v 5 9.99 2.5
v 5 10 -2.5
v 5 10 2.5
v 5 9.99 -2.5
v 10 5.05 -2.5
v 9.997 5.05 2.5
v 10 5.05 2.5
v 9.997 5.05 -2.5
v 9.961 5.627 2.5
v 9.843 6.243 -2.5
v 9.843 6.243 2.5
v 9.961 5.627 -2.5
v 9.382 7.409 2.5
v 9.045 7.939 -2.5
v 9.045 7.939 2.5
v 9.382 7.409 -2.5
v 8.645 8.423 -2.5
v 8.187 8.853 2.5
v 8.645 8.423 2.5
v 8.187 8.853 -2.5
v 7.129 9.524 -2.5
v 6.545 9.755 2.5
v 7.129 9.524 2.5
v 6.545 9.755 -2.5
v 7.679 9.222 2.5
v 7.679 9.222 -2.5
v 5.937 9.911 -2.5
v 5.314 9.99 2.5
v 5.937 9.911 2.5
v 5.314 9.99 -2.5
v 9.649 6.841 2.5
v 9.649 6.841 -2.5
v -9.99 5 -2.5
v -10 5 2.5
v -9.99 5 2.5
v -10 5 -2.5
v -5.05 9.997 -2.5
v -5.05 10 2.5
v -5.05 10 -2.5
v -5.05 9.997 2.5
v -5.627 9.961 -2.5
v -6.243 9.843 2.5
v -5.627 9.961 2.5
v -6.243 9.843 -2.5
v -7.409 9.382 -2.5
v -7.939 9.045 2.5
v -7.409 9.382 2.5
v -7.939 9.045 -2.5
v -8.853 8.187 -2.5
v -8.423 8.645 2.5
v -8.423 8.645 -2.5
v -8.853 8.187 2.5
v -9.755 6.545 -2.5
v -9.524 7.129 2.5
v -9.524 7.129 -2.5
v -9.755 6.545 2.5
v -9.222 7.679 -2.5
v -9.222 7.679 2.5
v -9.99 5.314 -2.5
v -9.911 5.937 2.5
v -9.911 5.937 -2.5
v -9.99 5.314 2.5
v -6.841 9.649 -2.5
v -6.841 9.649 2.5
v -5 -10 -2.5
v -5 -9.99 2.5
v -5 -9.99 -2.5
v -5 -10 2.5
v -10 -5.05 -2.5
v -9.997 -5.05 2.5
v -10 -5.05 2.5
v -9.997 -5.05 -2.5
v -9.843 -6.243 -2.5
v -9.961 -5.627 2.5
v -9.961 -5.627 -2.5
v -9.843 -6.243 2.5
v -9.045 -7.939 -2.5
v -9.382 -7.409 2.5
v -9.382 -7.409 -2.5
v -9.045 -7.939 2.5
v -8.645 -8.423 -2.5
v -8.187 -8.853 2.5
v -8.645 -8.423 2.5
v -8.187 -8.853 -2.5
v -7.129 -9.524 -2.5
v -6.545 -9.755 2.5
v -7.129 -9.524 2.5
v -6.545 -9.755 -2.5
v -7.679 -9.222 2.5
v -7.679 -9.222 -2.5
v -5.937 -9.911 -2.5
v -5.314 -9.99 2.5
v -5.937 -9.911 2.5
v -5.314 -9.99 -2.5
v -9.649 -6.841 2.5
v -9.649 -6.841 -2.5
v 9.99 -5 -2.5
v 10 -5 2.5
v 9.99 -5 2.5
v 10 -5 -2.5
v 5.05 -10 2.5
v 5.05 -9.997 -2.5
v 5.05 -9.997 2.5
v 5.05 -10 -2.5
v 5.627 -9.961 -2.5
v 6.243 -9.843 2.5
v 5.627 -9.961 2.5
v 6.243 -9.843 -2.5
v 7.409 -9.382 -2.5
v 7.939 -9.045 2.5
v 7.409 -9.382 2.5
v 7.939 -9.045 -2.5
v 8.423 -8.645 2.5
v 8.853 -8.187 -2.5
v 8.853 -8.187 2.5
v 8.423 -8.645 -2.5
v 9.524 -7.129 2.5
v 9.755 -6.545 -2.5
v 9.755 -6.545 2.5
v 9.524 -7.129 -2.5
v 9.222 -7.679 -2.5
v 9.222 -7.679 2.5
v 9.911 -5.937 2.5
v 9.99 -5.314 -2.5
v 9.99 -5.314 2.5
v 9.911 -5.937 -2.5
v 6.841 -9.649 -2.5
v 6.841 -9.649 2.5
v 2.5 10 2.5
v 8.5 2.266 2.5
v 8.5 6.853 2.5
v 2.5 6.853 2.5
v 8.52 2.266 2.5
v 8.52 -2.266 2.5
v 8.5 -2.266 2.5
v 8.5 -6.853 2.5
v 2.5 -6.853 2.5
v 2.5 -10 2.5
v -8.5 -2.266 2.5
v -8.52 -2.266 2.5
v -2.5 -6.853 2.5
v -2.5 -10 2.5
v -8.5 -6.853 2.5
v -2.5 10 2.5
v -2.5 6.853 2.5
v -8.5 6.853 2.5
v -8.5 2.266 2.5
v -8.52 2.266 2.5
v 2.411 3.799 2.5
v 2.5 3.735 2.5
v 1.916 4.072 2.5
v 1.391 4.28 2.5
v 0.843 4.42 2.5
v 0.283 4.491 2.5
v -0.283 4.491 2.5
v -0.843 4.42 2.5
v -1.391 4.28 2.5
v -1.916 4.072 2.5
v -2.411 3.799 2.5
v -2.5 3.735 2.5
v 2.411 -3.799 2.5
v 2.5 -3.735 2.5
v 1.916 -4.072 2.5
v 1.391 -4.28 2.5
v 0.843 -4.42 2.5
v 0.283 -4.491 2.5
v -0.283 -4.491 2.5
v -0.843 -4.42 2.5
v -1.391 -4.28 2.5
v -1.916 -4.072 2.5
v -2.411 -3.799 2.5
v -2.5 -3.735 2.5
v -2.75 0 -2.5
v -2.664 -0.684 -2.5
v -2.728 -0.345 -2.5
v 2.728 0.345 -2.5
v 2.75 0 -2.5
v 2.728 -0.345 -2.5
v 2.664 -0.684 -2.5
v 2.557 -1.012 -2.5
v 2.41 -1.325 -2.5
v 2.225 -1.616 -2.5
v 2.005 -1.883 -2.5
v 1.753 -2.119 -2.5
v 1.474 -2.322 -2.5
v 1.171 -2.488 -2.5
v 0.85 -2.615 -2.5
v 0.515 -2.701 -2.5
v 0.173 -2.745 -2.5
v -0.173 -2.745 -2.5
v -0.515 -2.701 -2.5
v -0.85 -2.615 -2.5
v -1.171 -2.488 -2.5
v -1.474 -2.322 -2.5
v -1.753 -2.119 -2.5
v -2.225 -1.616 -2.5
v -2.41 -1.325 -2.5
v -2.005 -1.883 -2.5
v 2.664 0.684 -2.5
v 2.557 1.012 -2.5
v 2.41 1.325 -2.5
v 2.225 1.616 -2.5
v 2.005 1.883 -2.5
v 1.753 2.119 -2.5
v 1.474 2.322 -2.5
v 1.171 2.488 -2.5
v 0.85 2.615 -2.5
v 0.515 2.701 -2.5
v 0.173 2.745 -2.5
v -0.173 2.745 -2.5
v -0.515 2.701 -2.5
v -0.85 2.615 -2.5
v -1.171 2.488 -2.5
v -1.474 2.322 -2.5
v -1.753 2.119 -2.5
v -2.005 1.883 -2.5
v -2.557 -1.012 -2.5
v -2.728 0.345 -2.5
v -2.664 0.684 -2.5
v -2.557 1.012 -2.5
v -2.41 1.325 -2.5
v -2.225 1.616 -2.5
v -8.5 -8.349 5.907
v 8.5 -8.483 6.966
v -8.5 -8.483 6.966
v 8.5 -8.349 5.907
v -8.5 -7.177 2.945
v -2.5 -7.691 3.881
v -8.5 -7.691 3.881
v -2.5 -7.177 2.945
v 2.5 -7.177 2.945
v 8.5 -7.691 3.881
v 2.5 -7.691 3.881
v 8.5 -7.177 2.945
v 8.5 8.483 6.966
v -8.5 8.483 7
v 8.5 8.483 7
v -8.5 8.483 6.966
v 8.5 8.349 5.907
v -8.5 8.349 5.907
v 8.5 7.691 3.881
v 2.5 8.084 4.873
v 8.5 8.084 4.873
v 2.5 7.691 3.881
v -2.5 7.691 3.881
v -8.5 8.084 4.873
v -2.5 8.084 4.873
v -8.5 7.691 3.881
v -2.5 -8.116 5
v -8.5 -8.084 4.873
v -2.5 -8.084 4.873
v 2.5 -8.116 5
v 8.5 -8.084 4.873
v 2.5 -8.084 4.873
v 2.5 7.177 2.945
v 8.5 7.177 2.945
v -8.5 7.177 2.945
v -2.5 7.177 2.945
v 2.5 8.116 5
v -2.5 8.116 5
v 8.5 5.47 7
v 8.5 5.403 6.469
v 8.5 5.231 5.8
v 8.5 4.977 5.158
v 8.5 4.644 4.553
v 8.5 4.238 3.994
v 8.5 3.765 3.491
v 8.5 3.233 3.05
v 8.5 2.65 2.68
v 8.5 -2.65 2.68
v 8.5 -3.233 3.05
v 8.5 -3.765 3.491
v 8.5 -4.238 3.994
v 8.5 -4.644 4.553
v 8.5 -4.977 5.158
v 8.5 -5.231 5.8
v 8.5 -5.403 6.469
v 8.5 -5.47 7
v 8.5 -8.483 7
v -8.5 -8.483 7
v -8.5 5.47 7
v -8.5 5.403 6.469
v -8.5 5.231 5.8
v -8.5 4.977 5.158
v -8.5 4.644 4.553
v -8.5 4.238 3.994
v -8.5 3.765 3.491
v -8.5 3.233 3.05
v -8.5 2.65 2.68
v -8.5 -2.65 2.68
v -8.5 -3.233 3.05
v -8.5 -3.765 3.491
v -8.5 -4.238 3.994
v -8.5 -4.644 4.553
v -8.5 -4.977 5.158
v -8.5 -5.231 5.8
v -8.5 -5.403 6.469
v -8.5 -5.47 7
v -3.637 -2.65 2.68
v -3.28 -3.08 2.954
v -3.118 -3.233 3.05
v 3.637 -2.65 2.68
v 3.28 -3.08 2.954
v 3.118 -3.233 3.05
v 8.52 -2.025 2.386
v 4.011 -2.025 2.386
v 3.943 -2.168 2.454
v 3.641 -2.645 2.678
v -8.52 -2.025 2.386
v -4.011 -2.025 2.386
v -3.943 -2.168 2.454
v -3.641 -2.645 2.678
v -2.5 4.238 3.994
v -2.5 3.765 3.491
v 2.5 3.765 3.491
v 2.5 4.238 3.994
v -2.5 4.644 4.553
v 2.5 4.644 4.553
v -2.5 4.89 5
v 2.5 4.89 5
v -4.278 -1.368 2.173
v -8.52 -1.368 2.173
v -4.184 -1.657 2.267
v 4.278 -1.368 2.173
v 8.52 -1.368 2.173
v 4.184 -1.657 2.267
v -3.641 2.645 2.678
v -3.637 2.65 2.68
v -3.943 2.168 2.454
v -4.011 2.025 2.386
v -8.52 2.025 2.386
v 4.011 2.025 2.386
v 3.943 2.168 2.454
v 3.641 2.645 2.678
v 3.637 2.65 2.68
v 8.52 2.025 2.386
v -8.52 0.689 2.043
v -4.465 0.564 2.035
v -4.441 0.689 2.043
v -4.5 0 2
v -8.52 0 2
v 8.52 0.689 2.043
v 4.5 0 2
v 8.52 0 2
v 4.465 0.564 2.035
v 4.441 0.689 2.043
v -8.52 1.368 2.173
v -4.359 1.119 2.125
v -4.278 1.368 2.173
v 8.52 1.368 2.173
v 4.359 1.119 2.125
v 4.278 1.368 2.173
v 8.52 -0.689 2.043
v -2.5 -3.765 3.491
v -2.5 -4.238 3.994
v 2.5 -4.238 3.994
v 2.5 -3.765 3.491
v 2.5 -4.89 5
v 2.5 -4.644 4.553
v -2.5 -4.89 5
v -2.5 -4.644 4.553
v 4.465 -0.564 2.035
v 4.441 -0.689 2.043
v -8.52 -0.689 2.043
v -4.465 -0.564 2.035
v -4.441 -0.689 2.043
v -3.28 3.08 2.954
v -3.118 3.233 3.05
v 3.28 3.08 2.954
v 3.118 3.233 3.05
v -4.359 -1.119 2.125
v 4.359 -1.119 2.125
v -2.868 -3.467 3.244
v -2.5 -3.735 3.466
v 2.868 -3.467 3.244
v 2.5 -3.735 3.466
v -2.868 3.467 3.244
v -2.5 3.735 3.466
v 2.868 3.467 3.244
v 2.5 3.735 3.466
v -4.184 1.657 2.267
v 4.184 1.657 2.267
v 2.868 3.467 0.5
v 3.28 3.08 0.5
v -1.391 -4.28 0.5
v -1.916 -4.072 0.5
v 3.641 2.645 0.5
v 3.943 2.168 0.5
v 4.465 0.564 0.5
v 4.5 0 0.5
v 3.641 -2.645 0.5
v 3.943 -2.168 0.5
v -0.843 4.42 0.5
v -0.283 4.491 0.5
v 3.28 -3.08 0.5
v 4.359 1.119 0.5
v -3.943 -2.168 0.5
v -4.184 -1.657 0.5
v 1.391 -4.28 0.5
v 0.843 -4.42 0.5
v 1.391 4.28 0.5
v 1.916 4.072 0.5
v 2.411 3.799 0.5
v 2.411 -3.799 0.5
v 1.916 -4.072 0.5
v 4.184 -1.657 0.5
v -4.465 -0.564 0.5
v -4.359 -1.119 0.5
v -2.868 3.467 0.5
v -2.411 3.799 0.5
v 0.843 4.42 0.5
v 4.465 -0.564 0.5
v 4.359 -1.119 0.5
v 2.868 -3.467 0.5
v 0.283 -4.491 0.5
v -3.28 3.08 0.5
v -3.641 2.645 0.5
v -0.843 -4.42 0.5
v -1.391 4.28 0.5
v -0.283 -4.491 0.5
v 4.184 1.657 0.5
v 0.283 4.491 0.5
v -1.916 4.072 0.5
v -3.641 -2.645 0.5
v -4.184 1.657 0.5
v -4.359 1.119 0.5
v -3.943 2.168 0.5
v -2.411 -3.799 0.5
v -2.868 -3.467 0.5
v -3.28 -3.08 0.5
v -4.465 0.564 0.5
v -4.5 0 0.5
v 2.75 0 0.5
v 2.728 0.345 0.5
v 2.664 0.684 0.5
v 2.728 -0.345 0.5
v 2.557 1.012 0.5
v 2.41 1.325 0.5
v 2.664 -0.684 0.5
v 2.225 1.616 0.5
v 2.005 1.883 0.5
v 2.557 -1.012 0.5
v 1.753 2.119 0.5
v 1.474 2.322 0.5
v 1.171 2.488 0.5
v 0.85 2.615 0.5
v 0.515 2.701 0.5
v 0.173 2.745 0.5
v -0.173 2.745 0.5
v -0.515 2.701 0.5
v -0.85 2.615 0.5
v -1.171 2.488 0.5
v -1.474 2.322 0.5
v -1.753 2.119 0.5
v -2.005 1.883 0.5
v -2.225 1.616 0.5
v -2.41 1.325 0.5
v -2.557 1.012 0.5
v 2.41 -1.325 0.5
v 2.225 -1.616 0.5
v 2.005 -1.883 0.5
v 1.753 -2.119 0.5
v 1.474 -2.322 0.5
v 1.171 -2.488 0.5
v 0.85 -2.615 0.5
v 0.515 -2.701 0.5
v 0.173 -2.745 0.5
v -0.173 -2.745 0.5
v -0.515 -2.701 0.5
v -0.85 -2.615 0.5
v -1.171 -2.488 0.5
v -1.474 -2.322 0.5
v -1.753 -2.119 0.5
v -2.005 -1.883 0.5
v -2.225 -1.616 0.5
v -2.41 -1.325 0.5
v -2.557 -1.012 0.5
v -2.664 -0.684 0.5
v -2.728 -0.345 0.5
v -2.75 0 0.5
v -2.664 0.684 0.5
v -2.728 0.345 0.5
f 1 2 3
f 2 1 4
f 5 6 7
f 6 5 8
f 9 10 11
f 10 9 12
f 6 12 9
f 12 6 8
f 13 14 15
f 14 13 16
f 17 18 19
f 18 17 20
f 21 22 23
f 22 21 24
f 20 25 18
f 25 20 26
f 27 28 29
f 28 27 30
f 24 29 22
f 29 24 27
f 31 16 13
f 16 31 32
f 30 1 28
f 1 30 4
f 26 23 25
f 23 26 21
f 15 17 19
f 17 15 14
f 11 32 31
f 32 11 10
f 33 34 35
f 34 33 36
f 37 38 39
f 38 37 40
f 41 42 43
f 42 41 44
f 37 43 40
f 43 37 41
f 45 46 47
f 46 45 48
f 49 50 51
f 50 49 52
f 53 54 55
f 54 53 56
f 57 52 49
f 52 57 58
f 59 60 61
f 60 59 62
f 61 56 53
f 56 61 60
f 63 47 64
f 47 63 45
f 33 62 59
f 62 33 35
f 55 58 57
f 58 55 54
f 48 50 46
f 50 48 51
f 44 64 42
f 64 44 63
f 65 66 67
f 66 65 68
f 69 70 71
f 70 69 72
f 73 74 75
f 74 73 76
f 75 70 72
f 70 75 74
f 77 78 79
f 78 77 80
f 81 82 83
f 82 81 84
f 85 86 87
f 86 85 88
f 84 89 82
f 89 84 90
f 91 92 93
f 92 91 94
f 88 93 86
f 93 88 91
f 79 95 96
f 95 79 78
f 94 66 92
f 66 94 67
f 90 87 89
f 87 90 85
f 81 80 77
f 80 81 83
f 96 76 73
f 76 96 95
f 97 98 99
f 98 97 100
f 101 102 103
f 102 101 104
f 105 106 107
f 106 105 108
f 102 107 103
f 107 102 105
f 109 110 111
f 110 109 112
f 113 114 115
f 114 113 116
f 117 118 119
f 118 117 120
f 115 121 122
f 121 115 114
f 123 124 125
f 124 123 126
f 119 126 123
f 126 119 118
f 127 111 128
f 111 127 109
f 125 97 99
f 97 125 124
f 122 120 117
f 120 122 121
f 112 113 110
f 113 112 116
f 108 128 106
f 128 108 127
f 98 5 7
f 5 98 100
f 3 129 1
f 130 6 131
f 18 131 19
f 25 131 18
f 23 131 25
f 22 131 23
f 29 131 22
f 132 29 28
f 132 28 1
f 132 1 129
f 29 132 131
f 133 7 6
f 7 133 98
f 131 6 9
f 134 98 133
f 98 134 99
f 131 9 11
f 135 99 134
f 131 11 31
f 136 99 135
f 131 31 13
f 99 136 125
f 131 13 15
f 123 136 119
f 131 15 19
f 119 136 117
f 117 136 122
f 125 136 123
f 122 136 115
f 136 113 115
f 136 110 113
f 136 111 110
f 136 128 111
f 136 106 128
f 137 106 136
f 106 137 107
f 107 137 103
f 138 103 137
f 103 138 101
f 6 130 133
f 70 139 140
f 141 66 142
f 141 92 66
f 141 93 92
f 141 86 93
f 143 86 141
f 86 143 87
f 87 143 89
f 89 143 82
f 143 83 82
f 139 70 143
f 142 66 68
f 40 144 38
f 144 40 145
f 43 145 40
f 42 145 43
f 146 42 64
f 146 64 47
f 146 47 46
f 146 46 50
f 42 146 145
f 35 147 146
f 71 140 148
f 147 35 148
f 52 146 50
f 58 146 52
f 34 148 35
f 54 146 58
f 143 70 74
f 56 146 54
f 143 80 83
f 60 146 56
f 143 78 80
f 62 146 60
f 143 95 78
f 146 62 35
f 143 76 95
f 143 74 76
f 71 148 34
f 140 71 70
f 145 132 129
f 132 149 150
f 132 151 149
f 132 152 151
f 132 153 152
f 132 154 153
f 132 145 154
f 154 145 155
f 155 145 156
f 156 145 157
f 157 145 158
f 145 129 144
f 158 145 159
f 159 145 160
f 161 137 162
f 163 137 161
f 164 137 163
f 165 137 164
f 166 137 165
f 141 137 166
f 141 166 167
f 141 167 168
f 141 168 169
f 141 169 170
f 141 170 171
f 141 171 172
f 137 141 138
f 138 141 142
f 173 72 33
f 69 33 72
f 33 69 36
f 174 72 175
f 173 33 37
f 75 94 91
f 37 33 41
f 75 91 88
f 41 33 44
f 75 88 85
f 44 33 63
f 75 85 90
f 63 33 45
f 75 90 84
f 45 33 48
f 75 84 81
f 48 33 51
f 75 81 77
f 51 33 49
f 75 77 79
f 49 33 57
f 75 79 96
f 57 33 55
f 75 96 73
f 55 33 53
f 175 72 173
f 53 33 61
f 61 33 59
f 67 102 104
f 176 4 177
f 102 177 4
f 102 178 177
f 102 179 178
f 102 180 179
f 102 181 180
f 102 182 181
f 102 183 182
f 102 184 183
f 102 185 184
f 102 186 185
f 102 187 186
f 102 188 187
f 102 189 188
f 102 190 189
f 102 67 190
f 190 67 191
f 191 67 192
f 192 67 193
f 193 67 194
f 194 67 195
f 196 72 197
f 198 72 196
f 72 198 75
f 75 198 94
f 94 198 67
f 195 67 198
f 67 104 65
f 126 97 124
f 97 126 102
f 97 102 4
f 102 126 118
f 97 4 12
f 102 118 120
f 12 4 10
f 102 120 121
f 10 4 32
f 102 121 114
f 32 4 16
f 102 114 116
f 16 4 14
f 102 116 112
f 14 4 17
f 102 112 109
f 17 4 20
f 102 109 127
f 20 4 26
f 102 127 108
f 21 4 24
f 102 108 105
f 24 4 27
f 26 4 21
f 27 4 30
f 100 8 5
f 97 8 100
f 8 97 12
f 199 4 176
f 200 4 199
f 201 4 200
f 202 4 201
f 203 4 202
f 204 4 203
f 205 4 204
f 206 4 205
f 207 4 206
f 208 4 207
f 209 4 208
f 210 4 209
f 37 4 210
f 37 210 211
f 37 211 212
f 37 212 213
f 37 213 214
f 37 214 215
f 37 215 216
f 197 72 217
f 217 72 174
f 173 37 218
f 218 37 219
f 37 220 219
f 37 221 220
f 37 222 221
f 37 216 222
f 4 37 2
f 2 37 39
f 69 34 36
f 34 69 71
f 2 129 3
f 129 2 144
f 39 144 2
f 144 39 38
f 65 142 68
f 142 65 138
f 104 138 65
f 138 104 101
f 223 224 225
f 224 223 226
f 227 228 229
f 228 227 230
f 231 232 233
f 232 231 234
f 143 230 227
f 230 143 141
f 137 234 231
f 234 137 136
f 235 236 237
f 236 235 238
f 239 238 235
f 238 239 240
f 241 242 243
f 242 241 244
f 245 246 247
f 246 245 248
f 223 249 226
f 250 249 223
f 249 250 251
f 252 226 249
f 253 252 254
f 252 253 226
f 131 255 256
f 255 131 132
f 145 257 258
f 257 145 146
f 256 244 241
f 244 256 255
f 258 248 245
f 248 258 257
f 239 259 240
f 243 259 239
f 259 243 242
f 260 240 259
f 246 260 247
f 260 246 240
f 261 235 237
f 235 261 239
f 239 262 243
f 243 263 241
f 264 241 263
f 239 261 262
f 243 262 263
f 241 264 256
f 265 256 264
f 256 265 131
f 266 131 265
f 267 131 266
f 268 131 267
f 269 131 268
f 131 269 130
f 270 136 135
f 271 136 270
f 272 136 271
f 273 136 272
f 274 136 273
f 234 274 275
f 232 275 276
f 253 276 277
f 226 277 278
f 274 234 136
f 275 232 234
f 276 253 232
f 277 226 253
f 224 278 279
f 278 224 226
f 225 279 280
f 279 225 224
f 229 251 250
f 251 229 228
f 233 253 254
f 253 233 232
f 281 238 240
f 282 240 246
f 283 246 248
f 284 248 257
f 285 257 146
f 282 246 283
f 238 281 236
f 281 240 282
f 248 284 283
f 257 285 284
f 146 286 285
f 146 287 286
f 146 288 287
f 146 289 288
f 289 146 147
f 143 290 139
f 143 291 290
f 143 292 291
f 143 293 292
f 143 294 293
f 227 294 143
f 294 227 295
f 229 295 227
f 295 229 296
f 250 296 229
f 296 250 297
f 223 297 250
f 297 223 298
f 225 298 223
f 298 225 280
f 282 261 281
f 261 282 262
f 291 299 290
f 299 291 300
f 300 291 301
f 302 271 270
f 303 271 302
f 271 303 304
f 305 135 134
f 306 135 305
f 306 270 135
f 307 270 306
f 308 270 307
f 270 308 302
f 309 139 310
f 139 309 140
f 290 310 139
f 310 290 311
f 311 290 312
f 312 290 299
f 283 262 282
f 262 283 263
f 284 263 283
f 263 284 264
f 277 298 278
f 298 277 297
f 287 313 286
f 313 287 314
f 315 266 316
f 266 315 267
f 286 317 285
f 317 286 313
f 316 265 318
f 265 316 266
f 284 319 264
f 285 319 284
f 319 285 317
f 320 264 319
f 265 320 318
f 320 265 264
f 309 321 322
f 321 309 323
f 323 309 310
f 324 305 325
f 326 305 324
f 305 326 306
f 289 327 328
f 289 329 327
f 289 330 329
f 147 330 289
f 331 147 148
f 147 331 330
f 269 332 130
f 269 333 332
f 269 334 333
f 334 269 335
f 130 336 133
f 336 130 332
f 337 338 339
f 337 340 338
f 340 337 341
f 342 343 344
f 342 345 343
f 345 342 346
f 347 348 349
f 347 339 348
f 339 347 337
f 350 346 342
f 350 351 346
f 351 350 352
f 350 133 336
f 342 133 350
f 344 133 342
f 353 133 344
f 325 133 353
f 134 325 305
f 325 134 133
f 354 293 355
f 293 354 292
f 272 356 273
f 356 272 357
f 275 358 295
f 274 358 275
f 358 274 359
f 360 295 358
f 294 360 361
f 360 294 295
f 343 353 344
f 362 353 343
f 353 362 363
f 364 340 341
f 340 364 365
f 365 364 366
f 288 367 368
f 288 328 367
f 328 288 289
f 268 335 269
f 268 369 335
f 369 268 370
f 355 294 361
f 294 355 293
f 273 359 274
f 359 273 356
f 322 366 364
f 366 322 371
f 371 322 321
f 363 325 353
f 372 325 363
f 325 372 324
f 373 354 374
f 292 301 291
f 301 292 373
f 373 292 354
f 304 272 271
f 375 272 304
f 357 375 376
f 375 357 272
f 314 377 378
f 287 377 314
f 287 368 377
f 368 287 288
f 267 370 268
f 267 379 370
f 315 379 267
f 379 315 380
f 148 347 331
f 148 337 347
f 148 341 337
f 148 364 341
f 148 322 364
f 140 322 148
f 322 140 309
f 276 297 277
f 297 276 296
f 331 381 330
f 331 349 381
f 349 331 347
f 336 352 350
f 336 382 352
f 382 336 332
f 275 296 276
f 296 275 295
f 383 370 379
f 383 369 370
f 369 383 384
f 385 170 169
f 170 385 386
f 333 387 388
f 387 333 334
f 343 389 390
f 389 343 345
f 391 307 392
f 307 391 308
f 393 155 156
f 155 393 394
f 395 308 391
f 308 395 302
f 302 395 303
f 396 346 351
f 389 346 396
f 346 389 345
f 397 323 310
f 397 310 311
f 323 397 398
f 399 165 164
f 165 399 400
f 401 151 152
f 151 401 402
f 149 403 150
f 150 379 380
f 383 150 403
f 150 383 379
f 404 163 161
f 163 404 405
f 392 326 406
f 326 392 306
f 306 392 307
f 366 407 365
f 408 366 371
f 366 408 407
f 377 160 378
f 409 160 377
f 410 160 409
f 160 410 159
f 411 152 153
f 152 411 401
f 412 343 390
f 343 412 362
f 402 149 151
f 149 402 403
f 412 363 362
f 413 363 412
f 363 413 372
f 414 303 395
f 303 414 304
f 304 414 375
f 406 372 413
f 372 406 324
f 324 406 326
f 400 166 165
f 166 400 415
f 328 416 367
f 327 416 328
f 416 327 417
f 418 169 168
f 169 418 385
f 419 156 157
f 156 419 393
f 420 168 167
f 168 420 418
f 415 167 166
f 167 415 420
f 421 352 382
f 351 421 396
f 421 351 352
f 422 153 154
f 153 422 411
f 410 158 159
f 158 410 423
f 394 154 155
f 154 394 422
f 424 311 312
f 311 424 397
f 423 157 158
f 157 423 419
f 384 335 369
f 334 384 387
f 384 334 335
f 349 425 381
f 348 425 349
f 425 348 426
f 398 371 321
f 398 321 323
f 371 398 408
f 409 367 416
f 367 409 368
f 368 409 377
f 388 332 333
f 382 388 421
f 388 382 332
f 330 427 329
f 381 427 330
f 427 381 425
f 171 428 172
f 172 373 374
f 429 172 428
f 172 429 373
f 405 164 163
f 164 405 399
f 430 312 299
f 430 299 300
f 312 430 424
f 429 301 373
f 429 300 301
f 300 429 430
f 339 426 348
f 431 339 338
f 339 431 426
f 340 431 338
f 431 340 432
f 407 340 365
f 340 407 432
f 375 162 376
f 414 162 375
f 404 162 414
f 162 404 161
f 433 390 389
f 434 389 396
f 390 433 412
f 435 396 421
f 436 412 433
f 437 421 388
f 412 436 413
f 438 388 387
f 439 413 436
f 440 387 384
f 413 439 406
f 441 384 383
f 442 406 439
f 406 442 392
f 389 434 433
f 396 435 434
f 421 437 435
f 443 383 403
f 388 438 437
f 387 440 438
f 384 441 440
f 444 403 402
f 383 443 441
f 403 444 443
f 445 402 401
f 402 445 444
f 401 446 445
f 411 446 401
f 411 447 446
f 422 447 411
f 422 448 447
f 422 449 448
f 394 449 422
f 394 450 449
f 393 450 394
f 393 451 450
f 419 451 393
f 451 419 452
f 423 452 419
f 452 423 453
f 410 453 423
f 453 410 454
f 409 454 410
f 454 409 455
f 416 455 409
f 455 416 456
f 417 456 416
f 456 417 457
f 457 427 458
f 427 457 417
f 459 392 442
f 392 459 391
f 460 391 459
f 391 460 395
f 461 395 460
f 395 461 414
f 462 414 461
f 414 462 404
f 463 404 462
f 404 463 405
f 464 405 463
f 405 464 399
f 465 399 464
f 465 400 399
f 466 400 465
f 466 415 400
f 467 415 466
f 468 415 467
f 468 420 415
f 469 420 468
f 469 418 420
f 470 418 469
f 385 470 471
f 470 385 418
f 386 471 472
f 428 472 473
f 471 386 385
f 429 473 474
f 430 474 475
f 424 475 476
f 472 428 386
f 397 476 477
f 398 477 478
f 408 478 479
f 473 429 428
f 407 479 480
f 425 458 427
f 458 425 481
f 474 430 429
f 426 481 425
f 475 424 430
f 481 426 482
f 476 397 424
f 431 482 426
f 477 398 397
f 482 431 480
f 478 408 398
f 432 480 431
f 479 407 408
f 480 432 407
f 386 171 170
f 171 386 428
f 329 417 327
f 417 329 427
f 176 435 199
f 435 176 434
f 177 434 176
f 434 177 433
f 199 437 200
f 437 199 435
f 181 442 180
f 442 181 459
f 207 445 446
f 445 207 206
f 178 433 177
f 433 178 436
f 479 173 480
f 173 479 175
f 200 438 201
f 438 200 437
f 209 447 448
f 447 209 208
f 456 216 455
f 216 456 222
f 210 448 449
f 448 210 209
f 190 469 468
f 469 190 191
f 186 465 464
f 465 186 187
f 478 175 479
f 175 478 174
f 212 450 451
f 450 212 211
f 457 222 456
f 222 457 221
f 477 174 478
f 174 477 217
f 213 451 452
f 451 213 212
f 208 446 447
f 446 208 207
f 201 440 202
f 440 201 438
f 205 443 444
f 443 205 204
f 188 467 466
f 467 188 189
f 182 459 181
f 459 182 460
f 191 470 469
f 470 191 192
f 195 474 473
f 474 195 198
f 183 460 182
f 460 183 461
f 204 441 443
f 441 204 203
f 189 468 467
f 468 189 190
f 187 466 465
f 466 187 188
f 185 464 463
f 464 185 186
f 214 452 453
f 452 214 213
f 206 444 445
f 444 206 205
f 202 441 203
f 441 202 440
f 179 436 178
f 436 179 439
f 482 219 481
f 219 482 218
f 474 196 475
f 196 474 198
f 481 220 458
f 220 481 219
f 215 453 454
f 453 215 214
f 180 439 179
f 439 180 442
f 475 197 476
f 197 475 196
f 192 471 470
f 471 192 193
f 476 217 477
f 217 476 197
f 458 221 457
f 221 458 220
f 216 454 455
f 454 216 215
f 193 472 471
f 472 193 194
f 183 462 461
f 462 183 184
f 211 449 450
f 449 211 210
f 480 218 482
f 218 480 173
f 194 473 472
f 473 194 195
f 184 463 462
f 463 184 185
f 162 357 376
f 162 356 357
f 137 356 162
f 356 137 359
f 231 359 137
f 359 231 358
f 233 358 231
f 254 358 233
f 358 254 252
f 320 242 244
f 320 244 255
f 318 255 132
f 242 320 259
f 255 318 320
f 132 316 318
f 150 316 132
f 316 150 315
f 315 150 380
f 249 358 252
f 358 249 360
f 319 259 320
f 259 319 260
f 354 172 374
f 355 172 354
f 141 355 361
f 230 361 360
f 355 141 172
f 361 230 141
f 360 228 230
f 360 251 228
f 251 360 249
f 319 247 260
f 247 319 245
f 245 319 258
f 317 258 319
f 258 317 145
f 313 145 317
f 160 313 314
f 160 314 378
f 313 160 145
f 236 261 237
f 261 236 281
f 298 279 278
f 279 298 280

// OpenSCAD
// base height
$bh=5;
// base width
$bw=20;
// metric bolt size
$bolt=5;
// 0=none, 1=align, 2=90 degrees. 
$tabs=0;

// DO NOT EDIT
$fn=50;

module makeTabs () {
    translate([$bw/2 - 6,-3, -2 - $bh/2]) cube([6,6,2]);
    translate([-$bw/2,-3, -2 - $bh/2]) cube([6,6,2]);
}


module createMeniscus(h,radius) // This module creates the shape that needs to be substracted from a cube to make its corners rounded.
difference(){        //This shape is basicly the difference between a quarter of cylinder and a cube
   translate([radius/2+0.1,radius/2+0.1,0]){
      cube([radius+0.2,radius+0.1,h+0.2],center=true);         // All that 0.x numbers are to avoid "ghost boundaries" when substracting
   }

   cylinder(h=h+0.2,r=radius,center=true);
}


module roundCornersCube(x,y,z,r)  // Now we just substract the shape we have created in the four corners
difference(){
   cube([x,y,z], center=true);

translate([x/2-r,y/2-r]){  // We move to the first corner (x,y)
      rotate(0){  
         createMeniscus(z,r); // And substract the meniscus
      }
   }
   translate([-x/2+r,y/2-r]){ // To the second corner (-x,y)
      rotate(90){
         createMeniscus(z,r); // But this time we have to rotate the meniscus 90 deg
      }
   }
      translate([-x/2+r,-y/2+r]){ // ... 
      rotate(180){
         createMeniscus(z,r);
      }
   }
      translate([x/2-r,-y/2+r]){
      rotate(270){
         createMeniscus(z,r);
      }
   }
}




// MAIN BODY
difference() {
    
    // Base + cylinder
    union() {
        roundCornersCube ($bw,$bw,$bh,$bw/4);
        translate ([$bw*0.425,0,$bw*0.425 + ($bh / 2) - 3.5]) 
            rotate (a=[0,-90,0]) 
            cylinder(h=$bw*0.85,r=$bw*0.425);
    }
    // Hollow out cylinder
    translate ([$bw*0.426,0,$bw*0.425 + ($bh / 2) - 3.5])
        rotate (a=[0,-90,0])
        cylinder(h=$bw*0.852,r=$bw*0.275);

    // bolt head
    translate([0,0,($bolt/2) - 2])
        cylinder(h=$bw,r=$bolt*0.9);
    
    // bolt hole
    translate([0,0,-$bh])
        cylinder(h=$bw,r=$bolt*0.55);
    
    // zip tie hole
    translate([-$bw/8,-$bw/2,$bh/2])
        cube([$bw/4,$bw,2.5]);

    // cut top half of cylinder
    translate([0,0,$bw*0.85])
        cube([$bw,$bw,$bw], center=true);
}


// Add alignment tabs
if ( $tabs == 1 ) {
    makeTabs();
} else if ( $tabs == 2 ) {
    rotate(a=[0,0,90]) makeTabs();
}
